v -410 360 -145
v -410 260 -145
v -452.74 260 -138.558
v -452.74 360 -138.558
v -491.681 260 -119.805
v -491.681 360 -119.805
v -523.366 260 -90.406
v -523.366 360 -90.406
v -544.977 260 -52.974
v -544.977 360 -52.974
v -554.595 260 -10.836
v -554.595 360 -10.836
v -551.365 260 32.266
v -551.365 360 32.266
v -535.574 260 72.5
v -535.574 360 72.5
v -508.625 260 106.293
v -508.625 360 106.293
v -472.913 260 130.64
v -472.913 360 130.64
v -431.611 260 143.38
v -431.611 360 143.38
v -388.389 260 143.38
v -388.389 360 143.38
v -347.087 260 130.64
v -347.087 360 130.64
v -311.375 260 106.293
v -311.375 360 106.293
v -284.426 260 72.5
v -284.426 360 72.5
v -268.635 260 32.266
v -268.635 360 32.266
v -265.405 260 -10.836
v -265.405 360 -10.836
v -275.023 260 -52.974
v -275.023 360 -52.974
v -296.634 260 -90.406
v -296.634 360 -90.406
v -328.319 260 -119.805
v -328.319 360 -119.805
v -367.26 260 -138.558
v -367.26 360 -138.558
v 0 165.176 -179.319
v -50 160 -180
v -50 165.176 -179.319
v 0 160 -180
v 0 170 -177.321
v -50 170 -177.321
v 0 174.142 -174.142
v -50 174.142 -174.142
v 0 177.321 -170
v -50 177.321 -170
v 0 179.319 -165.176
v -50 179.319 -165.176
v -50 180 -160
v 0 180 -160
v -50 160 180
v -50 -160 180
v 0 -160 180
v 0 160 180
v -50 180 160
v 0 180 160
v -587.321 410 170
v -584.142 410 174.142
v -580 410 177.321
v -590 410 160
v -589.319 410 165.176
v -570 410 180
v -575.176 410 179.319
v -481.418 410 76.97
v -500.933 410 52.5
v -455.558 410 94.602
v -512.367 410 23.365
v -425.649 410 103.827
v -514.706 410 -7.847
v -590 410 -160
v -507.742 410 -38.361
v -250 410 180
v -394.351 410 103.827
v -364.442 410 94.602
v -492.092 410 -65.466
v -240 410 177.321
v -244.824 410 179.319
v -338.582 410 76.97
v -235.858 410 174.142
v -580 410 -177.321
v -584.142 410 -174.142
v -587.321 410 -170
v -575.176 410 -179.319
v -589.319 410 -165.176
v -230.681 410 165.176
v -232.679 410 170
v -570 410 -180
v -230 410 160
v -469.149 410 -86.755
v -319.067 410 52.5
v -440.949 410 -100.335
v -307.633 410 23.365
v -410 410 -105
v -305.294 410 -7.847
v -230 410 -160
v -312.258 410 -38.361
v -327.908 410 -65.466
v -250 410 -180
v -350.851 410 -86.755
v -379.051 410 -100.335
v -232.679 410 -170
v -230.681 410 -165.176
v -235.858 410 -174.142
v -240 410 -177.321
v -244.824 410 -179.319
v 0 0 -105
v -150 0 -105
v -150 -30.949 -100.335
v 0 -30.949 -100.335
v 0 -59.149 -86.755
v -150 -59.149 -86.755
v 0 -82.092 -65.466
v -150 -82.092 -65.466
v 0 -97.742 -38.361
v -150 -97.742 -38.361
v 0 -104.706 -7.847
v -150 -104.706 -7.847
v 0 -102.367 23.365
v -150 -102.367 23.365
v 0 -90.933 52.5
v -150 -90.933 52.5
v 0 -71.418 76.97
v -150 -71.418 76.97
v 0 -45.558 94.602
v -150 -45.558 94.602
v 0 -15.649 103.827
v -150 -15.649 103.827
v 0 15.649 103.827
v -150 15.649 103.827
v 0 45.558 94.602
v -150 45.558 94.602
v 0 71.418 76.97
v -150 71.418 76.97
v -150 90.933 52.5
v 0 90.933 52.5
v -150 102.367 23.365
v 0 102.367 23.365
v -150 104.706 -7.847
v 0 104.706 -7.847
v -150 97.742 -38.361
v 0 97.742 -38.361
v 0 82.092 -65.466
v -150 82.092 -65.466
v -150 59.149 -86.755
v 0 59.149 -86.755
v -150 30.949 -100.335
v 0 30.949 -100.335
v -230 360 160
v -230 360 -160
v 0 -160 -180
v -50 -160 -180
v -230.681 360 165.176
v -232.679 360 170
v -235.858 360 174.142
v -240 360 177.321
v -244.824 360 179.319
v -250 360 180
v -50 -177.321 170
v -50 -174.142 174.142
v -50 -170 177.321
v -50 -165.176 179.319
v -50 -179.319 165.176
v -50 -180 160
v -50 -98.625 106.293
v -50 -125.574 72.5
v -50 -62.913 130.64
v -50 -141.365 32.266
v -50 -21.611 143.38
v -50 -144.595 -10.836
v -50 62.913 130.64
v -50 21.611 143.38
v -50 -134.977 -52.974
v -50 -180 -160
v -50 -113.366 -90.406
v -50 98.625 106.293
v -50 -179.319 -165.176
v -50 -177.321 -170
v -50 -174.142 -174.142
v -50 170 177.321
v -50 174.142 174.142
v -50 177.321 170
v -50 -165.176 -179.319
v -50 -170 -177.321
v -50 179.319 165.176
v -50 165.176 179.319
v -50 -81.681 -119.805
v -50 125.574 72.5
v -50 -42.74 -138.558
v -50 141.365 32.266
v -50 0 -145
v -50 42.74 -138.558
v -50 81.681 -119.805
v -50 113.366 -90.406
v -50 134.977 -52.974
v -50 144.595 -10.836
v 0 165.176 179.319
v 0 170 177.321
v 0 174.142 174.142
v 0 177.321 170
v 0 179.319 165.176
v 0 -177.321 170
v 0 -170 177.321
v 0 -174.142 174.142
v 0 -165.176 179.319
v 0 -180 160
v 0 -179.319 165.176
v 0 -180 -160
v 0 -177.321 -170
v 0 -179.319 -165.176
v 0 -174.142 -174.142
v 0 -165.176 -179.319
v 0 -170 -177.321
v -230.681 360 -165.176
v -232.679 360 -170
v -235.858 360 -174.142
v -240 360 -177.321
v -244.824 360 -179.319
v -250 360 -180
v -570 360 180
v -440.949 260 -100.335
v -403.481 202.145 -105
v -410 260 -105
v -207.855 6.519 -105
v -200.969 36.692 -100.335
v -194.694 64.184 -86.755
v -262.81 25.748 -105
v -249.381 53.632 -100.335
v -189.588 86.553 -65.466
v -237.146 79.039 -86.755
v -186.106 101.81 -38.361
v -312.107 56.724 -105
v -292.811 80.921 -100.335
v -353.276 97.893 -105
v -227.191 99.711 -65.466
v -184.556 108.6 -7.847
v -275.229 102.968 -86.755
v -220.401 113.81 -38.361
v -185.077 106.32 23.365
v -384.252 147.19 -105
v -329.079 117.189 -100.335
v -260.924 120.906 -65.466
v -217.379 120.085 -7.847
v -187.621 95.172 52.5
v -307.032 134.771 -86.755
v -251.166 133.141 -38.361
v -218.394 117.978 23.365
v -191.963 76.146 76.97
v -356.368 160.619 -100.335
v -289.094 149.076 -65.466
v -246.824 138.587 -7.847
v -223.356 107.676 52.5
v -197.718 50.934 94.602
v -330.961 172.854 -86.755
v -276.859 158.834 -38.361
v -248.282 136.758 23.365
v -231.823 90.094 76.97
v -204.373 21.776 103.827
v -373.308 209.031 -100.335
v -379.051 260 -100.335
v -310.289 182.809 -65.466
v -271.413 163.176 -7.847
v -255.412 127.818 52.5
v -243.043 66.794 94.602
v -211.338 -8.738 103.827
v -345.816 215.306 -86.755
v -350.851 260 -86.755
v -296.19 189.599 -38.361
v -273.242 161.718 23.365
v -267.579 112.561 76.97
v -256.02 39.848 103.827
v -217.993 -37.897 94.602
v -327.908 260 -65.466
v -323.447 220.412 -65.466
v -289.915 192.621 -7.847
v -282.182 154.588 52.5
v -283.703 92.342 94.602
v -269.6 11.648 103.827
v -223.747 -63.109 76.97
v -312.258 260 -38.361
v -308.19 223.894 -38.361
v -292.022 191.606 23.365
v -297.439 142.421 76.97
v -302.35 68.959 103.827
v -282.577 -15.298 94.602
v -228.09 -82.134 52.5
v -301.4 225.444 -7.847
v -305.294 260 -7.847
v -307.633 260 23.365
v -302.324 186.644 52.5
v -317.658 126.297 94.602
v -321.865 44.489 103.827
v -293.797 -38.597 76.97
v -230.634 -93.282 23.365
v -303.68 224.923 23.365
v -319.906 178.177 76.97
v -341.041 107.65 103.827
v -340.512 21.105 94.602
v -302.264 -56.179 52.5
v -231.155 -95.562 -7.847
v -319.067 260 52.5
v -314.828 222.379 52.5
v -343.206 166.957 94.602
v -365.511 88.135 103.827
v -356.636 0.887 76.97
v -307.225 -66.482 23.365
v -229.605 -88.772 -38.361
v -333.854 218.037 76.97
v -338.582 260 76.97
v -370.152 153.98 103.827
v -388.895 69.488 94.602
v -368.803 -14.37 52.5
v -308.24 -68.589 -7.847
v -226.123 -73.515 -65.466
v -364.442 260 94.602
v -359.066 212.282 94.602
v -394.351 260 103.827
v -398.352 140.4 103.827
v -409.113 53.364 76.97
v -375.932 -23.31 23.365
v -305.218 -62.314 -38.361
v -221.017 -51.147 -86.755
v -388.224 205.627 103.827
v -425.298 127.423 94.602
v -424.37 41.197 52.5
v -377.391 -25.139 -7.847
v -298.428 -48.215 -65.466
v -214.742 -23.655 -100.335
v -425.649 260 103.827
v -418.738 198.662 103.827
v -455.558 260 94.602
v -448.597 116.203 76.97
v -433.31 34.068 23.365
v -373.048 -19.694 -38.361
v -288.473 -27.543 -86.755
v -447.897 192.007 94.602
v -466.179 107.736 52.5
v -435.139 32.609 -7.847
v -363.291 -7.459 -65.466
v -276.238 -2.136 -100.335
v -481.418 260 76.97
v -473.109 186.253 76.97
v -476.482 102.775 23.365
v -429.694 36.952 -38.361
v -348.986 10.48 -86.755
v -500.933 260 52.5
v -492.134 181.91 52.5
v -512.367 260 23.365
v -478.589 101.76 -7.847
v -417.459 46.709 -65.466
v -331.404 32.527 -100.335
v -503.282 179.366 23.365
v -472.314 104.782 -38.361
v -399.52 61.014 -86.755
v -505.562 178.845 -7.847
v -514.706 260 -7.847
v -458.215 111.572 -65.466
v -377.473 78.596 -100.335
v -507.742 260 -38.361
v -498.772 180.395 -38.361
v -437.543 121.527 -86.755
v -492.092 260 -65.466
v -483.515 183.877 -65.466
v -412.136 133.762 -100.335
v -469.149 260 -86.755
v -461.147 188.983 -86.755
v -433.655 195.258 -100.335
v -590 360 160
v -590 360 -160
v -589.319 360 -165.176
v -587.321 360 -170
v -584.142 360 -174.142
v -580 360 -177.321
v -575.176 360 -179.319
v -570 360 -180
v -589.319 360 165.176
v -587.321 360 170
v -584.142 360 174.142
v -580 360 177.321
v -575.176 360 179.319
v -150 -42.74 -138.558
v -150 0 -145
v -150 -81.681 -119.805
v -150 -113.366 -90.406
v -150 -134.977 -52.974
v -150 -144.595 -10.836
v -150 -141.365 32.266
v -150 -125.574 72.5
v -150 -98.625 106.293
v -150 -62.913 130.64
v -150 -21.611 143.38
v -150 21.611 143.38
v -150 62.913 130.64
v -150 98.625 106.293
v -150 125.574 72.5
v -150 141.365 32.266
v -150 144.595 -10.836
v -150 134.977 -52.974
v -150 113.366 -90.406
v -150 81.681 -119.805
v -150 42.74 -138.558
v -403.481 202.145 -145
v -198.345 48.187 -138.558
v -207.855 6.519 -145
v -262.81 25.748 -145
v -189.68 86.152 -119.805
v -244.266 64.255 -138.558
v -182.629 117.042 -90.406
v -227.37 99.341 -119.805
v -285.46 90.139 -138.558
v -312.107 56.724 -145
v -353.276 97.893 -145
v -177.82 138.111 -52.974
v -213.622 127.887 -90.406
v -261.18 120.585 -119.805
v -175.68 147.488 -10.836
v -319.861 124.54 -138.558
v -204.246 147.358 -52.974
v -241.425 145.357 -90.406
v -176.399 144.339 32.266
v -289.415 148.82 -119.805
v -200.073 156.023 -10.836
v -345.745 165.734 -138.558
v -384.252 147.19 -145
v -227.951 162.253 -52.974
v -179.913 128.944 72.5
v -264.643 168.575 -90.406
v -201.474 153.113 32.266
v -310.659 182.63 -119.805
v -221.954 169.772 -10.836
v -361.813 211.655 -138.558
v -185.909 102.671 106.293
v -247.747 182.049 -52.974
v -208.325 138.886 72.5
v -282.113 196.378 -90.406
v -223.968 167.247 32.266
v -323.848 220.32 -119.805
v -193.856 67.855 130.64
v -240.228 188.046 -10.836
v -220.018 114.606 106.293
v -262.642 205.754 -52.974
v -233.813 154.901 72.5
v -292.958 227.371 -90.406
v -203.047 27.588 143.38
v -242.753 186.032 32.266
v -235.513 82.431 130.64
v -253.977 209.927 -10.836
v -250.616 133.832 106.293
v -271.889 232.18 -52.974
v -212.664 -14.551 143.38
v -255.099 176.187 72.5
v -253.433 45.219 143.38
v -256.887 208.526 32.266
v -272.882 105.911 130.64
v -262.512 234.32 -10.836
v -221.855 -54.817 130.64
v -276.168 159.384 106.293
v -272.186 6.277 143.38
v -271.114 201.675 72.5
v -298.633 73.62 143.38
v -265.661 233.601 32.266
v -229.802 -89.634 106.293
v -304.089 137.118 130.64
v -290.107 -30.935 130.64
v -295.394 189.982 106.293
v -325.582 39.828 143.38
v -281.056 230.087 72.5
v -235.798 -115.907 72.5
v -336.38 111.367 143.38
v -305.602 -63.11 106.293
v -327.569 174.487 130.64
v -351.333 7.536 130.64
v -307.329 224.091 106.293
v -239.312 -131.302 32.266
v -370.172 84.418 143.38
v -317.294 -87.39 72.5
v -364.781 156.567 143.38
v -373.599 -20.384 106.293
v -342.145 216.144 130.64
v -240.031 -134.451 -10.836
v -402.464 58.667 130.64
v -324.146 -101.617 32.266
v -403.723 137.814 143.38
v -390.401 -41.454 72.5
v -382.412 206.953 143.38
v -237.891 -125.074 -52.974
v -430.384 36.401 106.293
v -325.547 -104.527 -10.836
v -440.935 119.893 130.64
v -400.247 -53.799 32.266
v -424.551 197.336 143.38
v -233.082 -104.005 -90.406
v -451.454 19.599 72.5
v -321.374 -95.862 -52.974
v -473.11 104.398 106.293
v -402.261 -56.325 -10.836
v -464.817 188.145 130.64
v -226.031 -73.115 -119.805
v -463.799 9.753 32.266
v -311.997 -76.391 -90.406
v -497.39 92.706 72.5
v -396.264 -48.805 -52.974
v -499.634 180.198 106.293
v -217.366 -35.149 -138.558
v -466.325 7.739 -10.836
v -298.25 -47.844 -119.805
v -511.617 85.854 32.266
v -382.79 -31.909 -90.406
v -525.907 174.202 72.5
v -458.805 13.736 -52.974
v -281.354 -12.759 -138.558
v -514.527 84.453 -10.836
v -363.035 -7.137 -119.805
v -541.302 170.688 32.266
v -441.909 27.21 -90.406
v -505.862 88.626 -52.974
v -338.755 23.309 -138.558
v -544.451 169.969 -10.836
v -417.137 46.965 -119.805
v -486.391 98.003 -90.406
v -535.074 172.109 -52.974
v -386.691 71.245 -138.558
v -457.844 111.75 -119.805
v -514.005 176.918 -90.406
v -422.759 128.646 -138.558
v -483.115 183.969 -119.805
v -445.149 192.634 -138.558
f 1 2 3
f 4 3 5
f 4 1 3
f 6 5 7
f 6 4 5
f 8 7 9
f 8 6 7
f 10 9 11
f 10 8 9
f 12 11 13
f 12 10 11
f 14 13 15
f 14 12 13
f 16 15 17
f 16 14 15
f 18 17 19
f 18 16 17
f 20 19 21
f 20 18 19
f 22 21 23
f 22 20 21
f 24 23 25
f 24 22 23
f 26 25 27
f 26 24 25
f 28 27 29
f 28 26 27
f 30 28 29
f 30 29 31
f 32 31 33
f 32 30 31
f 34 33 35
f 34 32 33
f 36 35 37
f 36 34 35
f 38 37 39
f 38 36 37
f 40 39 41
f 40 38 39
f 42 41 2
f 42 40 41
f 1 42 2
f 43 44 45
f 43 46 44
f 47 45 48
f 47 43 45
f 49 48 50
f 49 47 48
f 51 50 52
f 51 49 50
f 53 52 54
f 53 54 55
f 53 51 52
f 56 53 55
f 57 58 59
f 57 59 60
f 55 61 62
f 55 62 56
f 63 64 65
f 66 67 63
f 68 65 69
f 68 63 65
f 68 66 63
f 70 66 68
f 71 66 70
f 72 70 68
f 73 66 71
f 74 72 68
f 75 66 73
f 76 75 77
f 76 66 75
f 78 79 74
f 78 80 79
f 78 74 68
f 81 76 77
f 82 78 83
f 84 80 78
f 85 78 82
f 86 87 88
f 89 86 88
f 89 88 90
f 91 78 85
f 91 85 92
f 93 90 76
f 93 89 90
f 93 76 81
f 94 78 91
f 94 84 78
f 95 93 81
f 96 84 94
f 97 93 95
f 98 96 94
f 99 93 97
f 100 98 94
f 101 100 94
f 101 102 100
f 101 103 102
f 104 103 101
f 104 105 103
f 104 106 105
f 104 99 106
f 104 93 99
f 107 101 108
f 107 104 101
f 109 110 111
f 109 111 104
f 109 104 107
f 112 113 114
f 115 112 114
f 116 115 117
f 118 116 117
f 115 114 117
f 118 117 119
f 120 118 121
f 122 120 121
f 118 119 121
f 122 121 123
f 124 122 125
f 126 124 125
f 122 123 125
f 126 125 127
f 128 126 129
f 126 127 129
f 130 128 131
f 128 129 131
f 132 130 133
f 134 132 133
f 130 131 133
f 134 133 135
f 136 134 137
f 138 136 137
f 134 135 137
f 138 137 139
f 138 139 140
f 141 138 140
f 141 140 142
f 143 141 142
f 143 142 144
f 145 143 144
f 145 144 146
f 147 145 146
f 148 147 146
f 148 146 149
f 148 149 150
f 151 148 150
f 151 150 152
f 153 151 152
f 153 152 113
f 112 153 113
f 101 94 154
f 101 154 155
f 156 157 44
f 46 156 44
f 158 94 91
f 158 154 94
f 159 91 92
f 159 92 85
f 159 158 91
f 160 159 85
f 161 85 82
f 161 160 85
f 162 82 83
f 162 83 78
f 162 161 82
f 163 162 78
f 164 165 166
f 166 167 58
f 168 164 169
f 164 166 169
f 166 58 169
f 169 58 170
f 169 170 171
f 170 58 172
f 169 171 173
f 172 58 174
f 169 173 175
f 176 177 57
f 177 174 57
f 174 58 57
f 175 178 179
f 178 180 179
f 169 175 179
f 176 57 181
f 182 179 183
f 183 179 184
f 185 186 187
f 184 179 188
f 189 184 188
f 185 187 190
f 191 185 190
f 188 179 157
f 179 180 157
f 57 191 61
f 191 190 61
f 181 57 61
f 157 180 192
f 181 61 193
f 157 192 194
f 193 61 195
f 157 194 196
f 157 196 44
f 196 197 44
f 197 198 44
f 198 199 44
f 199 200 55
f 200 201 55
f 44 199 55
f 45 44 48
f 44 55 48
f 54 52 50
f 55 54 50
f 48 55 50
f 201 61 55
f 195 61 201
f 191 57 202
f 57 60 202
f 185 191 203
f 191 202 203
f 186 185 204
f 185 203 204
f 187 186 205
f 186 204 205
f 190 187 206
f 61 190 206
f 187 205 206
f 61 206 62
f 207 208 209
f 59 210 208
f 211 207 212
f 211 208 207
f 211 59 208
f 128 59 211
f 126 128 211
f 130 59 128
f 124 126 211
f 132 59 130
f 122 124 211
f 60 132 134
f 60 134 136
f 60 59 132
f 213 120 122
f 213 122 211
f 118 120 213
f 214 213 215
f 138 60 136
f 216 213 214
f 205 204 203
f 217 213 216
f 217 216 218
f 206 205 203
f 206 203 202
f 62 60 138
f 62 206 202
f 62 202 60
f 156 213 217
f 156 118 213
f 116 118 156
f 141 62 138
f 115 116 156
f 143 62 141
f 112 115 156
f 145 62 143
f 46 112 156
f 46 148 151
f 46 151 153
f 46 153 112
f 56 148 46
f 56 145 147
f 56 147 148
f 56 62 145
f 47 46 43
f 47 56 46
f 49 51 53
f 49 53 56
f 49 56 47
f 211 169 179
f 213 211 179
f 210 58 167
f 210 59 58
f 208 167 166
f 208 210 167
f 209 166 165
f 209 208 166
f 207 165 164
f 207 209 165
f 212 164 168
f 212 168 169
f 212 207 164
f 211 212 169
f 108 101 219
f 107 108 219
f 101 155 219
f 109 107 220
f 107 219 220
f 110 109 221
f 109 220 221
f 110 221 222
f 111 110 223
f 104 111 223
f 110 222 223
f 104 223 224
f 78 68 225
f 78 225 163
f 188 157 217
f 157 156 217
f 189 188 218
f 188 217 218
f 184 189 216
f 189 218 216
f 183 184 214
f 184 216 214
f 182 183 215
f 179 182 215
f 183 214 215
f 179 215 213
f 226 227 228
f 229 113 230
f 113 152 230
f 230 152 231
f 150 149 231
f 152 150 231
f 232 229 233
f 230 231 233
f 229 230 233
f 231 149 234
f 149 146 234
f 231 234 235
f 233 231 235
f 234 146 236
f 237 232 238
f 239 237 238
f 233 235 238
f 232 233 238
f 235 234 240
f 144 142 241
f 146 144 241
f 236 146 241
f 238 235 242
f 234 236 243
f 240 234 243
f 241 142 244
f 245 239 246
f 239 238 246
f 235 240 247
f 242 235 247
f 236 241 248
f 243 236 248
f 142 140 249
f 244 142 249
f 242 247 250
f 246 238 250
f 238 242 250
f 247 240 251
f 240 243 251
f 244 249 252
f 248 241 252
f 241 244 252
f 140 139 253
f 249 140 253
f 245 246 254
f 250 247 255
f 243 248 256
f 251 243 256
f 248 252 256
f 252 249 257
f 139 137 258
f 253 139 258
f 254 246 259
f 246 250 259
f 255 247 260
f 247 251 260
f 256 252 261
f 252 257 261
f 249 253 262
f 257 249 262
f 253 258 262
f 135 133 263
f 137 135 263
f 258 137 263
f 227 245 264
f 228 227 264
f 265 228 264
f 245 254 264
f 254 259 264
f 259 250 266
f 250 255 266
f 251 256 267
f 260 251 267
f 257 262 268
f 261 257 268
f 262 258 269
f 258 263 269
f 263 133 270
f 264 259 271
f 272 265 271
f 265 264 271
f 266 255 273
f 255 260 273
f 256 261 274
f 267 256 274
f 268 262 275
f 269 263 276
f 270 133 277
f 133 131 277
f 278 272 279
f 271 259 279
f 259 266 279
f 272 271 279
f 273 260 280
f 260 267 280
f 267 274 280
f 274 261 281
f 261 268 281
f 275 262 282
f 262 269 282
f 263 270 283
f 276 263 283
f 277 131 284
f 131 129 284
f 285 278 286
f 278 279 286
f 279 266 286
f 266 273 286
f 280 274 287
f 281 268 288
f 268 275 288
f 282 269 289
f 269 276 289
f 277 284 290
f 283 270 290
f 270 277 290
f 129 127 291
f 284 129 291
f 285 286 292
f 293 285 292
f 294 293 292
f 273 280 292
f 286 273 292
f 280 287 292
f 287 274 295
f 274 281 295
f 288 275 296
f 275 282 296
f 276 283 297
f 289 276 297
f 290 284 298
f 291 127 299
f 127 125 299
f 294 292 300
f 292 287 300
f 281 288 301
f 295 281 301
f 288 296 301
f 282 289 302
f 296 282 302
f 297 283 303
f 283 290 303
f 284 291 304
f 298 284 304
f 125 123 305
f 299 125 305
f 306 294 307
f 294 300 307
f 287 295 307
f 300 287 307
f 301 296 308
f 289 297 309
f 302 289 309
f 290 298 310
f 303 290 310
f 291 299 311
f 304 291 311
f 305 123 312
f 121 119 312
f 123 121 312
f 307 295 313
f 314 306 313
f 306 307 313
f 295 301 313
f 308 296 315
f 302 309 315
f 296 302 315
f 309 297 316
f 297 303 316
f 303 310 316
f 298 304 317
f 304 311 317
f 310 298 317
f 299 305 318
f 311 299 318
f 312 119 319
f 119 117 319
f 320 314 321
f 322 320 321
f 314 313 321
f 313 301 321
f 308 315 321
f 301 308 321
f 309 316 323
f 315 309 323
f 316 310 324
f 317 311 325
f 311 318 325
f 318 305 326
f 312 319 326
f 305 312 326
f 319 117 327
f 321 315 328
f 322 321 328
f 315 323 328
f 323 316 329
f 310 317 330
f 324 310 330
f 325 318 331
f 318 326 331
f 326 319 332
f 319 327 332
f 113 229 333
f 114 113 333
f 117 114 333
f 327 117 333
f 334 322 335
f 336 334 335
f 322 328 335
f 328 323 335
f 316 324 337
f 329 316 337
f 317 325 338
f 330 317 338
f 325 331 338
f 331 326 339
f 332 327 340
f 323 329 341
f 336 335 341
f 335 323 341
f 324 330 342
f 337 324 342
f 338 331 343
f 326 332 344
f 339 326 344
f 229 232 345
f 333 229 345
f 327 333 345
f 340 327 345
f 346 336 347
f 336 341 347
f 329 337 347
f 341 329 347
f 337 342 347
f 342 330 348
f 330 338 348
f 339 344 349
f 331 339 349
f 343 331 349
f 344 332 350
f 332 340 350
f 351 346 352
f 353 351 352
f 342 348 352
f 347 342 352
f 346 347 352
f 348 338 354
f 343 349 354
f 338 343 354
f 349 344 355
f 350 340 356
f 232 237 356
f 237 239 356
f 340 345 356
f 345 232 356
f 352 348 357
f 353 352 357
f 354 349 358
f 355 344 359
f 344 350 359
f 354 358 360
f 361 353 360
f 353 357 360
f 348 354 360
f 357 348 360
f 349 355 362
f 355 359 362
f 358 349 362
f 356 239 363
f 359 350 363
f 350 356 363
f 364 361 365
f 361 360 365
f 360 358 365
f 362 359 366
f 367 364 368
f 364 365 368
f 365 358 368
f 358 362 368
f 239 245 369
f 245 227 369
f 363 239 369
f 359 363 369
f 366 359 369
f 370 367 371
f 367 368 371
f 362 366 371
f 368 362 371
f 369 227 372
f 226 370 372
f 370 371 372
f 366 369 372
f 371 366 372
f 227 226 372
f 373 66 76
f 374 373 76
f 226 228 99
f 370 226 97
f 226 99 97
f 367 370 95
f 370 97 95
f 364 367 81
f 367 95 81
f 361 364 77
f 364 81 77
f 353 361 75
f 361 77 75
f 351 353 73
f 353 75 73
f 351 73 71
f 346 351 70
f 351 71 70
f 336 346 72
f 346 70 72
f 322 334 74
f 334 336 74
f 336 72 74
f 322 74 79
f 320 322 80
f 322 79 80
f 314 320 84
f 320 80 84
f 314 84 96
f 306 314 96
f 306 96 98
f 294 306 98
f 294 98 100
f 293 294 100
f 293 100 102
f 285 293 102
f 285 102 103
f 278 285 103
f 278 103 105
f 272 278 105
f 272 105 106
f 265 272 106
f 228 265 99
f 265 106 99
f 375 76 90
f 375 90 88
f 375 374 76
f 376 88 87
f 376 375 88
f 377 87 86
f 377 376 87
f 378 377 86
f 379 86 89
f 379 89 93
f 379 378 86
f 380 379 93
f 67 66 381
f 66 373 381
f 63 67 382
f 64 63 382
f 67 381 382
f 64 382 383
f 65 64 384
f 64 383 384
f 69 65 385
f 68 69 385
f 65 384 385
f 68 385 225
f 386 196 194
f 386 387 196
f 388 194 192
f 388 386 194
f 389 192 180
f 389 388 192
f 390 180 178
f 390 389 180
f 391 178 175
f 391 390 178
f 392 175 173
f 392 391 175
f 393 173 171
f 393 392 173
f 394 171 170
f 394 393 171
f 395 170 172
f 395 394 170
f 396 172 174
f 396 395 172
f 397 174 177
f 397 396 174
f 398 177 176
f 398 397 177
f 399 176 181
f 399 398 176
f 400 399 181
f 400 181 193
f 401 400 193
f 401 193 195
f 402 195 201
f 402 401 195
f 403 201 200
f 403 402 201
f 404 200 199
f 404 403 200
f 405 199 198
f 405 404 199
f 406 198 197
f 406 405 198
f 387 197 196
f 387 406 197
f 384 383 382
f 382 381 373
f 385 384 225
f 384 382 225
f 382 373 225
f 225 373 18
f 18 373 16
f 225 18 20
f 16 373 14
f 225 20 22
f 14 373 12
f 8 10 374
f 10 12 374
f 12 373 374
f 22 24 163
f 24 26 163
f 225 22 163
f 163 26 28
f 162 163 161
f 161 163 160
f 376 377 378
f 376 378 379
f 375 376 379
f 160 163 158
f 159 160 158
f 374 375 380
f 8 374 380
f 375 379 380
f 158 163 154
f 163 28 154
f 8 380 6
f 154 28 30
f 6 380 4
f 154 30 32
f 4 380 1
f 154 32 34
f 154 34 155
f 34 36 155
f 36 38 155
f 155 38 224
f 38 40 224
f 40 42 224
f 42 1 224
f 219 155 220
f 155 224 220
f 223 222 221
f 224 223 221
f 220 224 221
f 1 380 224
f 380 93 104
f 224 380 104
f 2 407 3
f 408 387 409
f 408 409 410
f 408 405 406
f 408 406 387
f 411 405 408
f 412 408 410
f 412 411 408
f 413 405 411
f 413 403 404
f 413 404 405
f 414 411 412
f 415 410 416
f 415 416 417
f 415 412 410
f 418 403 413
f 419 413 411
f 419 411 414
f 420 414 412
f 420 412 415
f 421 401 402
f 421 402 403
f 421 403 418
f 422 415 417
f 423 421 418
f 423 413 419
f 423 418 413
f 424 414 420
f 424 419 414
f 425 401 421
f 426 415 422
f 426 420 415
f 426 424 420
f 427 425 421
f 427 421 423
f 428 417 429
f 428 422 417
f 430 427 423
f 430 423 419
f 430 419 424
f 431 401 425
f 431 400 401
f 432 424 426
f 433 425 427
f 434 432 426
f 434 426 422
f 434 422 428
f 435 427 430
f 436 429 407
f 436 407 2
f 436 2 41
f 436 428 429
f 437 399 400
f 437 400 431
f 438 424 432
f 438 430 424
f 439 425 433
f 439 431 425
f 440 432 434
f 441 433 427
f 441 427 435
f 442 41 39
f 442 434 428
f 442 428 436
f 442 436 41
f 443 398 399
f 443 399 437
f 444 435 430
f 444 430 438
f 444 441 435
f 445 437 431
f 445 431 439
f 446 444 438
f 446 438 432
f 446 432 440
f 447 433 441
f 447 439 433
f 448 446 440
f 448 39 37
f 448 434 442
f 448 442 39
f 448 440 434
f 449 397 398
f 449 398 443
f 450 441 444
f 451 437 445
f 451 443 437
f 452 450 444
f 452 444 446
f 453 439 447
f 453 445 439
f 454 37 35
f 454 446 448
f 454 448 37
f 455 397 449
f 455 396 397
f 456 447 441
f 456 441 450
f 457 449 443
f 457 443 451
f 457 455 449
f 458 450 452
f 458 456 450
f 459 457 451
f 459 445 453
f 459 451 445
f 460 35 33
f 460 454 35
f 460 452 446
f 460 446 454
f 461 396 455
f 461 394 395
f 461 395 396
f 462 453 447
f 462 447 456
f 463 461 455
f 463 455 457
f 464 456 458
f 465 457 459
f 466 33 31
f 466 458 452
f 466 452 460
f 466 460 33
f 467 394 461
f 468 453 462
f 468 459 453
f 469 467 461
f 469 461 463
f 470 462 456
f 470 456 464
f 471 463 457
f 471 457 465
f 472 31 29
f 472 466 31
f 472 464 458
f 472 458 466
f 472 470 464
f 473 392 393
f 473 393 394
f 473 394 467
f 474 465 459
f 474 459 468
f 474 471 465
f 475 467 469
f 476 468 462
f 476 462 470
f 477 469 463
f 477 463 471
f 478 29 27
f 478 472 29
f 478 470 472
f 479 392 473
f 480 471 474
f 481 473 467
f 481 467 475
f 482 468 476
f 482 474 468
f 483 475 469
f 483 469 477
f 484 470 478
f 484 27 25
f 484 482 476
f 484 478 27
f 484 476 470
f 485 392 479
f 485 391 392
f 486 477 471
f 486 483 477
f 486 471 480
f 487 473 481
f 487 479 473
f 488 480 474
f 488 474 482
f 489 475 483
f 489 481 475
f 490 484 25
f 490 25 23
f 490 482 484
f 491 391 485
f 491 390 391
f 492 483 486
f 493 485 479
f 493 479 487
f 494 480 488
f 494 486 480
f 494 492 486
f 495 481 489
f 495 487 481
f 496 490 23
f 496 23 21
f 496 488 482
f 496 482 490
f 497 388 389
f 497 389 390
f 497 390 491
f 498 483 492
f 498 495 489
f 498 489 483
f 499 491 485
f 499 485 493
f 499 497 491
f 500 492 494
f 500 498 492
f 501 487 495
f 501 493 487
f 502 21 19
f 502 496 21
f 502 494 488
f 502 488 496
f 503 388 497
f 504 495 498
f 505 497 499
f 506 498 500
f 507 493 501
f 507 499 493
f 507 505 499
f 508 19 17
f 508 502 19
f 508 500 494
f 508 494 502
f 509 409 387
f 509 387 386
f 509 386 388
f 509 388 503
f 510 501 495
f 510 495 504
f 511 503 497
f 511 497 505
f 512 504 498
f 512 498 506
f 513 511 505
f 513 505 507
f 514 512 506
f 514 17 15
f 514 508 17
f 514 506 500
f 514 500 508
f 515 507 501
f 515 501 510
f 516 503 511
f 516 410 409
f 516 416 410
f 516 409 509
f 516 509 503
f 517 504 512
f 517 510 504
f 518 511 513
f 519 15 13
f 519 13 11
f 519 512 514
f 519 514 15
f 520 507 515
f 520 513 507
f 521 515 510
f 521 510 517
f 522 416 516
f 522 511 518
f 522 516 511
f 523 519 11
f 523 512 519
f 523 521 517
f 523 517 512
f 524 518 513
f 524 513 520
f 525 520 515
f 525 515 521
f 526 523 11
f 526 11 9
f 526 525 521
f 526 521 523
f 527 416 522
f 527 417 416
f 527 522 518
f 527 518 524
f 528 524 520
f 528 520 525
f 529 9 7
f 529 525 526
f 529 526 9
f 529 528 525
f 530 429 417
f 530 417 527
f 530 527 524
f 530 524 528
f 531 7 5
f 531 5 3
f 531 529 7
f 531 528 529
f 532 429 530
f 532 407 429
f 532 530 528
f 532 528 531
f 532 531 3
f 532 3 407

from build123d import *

# Parameters (mm, degrees)
SKETCH3_R           = 145
SKETCH3_R_2         = 105
BOSS_EXTRUDE1_START = -50
SKETCH4_W           = 360
SKETCH4_H           = 360
SKETCH4_R           = 145
BOSS_EXTRUDE1_DEPTH = 50
FILLET1_R           = 20
SKETCH6_W           = 360
SKETCH6_H           = 360
SKETCH6_R           = 145
BOSS_EXTRUDE2_DEPTH = 50
FILLET2_R           = 20
SKETCH7_R           = 30
BOSS_EXTRUDE4_DEPTH = 10


with BuildPart() as part:
    # Sweep-Thin1: sweep along a path in Sketch2
    with BuildLine(Plane.XY) as sweep_thin1_path:
        Line((0, 0), (-150, 0))
        ThreePointArc((-150, 0), (-333.847763109, 76.152236891), (-410, 260))
        Line((-410, 260), (-410, 410))
    # Sketch3 → Sweep-Thin1 (sweep)
    with BuildSketch(Plane(origin=(0, 0, 0), x_dir=(0, 0, -1), z_dir=(1, 0, 0))):
        Circle(SKETCH3_R)
        Circle(SKETCH3_R_2, mode=Mode.SUBTRACT)
    sweep(path=sweep_thin1_path.line)

    # Sketch4 → Boss-Extrude1 (add)
    with BuildSketch(Plane(origin=(0, 0, 0), x_dir=(0, 0, -1), z_dir=(1, 0, 0)).offset(BOSS_EXTRUDE1_START)):
        Rectangle(SKETCH4_W, SKETCH4_H)
        with Locations(Location((0, 0, 0), (0, 0, 270))):
            Circle(SKETCH4_R, mode=Mode.SUBTRACT)
    extrude(amount=BOSS_EXTRUDE1_DEPTH)

    # Fillet1
    fillet1_edges = [part.edges().sort_by_distance(p)[0] for p in [
        (-25, -180, -180),
        (-25, -180, 180),
        (-25, 180, 180),
        (-25, 180, -180),
    ]]
    fillet(fillet1_edges, radius=FILLET1_R)

    # Sketch6 → Boss-Extrude2 (add)
    with BuildSketch(Plane(origin=(0, 410, 0), x_dir=(1, 0, 0), z_dir=(0, 1, 0))):
        with Locations((-410, 0)):
            Rectangle(SKETCH6_W, SKETCH6_H)
        with Locations(Location((-410, 0, 0), (0, 0, 180))):
            Circle(SKETCH6_R, mode=Mode.SUBTRACT)
    extrude(amount=-BOSS_EXTRUDE2_DEPTH)

    # Fillet2
    fillet2_edges = [part.edges().sort_by_distance(p)[0] for p in [
        (-230, 385, 180),
        (-590, 385, 180),
        (-590, 385, -180),
        (-230, 385, -180),
    ]]
    fillet(fillet2_edges, radius=FILLET2_R)

    # Sketch7 → Boss-Extrude4 (add)
    with BuildSketch(Plane(origin=(0, 0, 0), x_dir=(0, 0, -1), z_dir=(1, 0, 0))):
        with Locations((-130, 130)):
            Circle(SKETCH7_R)
    extrude(amount=-BOSS_EXTRUDE4_DEPTH)


solid = part.part
